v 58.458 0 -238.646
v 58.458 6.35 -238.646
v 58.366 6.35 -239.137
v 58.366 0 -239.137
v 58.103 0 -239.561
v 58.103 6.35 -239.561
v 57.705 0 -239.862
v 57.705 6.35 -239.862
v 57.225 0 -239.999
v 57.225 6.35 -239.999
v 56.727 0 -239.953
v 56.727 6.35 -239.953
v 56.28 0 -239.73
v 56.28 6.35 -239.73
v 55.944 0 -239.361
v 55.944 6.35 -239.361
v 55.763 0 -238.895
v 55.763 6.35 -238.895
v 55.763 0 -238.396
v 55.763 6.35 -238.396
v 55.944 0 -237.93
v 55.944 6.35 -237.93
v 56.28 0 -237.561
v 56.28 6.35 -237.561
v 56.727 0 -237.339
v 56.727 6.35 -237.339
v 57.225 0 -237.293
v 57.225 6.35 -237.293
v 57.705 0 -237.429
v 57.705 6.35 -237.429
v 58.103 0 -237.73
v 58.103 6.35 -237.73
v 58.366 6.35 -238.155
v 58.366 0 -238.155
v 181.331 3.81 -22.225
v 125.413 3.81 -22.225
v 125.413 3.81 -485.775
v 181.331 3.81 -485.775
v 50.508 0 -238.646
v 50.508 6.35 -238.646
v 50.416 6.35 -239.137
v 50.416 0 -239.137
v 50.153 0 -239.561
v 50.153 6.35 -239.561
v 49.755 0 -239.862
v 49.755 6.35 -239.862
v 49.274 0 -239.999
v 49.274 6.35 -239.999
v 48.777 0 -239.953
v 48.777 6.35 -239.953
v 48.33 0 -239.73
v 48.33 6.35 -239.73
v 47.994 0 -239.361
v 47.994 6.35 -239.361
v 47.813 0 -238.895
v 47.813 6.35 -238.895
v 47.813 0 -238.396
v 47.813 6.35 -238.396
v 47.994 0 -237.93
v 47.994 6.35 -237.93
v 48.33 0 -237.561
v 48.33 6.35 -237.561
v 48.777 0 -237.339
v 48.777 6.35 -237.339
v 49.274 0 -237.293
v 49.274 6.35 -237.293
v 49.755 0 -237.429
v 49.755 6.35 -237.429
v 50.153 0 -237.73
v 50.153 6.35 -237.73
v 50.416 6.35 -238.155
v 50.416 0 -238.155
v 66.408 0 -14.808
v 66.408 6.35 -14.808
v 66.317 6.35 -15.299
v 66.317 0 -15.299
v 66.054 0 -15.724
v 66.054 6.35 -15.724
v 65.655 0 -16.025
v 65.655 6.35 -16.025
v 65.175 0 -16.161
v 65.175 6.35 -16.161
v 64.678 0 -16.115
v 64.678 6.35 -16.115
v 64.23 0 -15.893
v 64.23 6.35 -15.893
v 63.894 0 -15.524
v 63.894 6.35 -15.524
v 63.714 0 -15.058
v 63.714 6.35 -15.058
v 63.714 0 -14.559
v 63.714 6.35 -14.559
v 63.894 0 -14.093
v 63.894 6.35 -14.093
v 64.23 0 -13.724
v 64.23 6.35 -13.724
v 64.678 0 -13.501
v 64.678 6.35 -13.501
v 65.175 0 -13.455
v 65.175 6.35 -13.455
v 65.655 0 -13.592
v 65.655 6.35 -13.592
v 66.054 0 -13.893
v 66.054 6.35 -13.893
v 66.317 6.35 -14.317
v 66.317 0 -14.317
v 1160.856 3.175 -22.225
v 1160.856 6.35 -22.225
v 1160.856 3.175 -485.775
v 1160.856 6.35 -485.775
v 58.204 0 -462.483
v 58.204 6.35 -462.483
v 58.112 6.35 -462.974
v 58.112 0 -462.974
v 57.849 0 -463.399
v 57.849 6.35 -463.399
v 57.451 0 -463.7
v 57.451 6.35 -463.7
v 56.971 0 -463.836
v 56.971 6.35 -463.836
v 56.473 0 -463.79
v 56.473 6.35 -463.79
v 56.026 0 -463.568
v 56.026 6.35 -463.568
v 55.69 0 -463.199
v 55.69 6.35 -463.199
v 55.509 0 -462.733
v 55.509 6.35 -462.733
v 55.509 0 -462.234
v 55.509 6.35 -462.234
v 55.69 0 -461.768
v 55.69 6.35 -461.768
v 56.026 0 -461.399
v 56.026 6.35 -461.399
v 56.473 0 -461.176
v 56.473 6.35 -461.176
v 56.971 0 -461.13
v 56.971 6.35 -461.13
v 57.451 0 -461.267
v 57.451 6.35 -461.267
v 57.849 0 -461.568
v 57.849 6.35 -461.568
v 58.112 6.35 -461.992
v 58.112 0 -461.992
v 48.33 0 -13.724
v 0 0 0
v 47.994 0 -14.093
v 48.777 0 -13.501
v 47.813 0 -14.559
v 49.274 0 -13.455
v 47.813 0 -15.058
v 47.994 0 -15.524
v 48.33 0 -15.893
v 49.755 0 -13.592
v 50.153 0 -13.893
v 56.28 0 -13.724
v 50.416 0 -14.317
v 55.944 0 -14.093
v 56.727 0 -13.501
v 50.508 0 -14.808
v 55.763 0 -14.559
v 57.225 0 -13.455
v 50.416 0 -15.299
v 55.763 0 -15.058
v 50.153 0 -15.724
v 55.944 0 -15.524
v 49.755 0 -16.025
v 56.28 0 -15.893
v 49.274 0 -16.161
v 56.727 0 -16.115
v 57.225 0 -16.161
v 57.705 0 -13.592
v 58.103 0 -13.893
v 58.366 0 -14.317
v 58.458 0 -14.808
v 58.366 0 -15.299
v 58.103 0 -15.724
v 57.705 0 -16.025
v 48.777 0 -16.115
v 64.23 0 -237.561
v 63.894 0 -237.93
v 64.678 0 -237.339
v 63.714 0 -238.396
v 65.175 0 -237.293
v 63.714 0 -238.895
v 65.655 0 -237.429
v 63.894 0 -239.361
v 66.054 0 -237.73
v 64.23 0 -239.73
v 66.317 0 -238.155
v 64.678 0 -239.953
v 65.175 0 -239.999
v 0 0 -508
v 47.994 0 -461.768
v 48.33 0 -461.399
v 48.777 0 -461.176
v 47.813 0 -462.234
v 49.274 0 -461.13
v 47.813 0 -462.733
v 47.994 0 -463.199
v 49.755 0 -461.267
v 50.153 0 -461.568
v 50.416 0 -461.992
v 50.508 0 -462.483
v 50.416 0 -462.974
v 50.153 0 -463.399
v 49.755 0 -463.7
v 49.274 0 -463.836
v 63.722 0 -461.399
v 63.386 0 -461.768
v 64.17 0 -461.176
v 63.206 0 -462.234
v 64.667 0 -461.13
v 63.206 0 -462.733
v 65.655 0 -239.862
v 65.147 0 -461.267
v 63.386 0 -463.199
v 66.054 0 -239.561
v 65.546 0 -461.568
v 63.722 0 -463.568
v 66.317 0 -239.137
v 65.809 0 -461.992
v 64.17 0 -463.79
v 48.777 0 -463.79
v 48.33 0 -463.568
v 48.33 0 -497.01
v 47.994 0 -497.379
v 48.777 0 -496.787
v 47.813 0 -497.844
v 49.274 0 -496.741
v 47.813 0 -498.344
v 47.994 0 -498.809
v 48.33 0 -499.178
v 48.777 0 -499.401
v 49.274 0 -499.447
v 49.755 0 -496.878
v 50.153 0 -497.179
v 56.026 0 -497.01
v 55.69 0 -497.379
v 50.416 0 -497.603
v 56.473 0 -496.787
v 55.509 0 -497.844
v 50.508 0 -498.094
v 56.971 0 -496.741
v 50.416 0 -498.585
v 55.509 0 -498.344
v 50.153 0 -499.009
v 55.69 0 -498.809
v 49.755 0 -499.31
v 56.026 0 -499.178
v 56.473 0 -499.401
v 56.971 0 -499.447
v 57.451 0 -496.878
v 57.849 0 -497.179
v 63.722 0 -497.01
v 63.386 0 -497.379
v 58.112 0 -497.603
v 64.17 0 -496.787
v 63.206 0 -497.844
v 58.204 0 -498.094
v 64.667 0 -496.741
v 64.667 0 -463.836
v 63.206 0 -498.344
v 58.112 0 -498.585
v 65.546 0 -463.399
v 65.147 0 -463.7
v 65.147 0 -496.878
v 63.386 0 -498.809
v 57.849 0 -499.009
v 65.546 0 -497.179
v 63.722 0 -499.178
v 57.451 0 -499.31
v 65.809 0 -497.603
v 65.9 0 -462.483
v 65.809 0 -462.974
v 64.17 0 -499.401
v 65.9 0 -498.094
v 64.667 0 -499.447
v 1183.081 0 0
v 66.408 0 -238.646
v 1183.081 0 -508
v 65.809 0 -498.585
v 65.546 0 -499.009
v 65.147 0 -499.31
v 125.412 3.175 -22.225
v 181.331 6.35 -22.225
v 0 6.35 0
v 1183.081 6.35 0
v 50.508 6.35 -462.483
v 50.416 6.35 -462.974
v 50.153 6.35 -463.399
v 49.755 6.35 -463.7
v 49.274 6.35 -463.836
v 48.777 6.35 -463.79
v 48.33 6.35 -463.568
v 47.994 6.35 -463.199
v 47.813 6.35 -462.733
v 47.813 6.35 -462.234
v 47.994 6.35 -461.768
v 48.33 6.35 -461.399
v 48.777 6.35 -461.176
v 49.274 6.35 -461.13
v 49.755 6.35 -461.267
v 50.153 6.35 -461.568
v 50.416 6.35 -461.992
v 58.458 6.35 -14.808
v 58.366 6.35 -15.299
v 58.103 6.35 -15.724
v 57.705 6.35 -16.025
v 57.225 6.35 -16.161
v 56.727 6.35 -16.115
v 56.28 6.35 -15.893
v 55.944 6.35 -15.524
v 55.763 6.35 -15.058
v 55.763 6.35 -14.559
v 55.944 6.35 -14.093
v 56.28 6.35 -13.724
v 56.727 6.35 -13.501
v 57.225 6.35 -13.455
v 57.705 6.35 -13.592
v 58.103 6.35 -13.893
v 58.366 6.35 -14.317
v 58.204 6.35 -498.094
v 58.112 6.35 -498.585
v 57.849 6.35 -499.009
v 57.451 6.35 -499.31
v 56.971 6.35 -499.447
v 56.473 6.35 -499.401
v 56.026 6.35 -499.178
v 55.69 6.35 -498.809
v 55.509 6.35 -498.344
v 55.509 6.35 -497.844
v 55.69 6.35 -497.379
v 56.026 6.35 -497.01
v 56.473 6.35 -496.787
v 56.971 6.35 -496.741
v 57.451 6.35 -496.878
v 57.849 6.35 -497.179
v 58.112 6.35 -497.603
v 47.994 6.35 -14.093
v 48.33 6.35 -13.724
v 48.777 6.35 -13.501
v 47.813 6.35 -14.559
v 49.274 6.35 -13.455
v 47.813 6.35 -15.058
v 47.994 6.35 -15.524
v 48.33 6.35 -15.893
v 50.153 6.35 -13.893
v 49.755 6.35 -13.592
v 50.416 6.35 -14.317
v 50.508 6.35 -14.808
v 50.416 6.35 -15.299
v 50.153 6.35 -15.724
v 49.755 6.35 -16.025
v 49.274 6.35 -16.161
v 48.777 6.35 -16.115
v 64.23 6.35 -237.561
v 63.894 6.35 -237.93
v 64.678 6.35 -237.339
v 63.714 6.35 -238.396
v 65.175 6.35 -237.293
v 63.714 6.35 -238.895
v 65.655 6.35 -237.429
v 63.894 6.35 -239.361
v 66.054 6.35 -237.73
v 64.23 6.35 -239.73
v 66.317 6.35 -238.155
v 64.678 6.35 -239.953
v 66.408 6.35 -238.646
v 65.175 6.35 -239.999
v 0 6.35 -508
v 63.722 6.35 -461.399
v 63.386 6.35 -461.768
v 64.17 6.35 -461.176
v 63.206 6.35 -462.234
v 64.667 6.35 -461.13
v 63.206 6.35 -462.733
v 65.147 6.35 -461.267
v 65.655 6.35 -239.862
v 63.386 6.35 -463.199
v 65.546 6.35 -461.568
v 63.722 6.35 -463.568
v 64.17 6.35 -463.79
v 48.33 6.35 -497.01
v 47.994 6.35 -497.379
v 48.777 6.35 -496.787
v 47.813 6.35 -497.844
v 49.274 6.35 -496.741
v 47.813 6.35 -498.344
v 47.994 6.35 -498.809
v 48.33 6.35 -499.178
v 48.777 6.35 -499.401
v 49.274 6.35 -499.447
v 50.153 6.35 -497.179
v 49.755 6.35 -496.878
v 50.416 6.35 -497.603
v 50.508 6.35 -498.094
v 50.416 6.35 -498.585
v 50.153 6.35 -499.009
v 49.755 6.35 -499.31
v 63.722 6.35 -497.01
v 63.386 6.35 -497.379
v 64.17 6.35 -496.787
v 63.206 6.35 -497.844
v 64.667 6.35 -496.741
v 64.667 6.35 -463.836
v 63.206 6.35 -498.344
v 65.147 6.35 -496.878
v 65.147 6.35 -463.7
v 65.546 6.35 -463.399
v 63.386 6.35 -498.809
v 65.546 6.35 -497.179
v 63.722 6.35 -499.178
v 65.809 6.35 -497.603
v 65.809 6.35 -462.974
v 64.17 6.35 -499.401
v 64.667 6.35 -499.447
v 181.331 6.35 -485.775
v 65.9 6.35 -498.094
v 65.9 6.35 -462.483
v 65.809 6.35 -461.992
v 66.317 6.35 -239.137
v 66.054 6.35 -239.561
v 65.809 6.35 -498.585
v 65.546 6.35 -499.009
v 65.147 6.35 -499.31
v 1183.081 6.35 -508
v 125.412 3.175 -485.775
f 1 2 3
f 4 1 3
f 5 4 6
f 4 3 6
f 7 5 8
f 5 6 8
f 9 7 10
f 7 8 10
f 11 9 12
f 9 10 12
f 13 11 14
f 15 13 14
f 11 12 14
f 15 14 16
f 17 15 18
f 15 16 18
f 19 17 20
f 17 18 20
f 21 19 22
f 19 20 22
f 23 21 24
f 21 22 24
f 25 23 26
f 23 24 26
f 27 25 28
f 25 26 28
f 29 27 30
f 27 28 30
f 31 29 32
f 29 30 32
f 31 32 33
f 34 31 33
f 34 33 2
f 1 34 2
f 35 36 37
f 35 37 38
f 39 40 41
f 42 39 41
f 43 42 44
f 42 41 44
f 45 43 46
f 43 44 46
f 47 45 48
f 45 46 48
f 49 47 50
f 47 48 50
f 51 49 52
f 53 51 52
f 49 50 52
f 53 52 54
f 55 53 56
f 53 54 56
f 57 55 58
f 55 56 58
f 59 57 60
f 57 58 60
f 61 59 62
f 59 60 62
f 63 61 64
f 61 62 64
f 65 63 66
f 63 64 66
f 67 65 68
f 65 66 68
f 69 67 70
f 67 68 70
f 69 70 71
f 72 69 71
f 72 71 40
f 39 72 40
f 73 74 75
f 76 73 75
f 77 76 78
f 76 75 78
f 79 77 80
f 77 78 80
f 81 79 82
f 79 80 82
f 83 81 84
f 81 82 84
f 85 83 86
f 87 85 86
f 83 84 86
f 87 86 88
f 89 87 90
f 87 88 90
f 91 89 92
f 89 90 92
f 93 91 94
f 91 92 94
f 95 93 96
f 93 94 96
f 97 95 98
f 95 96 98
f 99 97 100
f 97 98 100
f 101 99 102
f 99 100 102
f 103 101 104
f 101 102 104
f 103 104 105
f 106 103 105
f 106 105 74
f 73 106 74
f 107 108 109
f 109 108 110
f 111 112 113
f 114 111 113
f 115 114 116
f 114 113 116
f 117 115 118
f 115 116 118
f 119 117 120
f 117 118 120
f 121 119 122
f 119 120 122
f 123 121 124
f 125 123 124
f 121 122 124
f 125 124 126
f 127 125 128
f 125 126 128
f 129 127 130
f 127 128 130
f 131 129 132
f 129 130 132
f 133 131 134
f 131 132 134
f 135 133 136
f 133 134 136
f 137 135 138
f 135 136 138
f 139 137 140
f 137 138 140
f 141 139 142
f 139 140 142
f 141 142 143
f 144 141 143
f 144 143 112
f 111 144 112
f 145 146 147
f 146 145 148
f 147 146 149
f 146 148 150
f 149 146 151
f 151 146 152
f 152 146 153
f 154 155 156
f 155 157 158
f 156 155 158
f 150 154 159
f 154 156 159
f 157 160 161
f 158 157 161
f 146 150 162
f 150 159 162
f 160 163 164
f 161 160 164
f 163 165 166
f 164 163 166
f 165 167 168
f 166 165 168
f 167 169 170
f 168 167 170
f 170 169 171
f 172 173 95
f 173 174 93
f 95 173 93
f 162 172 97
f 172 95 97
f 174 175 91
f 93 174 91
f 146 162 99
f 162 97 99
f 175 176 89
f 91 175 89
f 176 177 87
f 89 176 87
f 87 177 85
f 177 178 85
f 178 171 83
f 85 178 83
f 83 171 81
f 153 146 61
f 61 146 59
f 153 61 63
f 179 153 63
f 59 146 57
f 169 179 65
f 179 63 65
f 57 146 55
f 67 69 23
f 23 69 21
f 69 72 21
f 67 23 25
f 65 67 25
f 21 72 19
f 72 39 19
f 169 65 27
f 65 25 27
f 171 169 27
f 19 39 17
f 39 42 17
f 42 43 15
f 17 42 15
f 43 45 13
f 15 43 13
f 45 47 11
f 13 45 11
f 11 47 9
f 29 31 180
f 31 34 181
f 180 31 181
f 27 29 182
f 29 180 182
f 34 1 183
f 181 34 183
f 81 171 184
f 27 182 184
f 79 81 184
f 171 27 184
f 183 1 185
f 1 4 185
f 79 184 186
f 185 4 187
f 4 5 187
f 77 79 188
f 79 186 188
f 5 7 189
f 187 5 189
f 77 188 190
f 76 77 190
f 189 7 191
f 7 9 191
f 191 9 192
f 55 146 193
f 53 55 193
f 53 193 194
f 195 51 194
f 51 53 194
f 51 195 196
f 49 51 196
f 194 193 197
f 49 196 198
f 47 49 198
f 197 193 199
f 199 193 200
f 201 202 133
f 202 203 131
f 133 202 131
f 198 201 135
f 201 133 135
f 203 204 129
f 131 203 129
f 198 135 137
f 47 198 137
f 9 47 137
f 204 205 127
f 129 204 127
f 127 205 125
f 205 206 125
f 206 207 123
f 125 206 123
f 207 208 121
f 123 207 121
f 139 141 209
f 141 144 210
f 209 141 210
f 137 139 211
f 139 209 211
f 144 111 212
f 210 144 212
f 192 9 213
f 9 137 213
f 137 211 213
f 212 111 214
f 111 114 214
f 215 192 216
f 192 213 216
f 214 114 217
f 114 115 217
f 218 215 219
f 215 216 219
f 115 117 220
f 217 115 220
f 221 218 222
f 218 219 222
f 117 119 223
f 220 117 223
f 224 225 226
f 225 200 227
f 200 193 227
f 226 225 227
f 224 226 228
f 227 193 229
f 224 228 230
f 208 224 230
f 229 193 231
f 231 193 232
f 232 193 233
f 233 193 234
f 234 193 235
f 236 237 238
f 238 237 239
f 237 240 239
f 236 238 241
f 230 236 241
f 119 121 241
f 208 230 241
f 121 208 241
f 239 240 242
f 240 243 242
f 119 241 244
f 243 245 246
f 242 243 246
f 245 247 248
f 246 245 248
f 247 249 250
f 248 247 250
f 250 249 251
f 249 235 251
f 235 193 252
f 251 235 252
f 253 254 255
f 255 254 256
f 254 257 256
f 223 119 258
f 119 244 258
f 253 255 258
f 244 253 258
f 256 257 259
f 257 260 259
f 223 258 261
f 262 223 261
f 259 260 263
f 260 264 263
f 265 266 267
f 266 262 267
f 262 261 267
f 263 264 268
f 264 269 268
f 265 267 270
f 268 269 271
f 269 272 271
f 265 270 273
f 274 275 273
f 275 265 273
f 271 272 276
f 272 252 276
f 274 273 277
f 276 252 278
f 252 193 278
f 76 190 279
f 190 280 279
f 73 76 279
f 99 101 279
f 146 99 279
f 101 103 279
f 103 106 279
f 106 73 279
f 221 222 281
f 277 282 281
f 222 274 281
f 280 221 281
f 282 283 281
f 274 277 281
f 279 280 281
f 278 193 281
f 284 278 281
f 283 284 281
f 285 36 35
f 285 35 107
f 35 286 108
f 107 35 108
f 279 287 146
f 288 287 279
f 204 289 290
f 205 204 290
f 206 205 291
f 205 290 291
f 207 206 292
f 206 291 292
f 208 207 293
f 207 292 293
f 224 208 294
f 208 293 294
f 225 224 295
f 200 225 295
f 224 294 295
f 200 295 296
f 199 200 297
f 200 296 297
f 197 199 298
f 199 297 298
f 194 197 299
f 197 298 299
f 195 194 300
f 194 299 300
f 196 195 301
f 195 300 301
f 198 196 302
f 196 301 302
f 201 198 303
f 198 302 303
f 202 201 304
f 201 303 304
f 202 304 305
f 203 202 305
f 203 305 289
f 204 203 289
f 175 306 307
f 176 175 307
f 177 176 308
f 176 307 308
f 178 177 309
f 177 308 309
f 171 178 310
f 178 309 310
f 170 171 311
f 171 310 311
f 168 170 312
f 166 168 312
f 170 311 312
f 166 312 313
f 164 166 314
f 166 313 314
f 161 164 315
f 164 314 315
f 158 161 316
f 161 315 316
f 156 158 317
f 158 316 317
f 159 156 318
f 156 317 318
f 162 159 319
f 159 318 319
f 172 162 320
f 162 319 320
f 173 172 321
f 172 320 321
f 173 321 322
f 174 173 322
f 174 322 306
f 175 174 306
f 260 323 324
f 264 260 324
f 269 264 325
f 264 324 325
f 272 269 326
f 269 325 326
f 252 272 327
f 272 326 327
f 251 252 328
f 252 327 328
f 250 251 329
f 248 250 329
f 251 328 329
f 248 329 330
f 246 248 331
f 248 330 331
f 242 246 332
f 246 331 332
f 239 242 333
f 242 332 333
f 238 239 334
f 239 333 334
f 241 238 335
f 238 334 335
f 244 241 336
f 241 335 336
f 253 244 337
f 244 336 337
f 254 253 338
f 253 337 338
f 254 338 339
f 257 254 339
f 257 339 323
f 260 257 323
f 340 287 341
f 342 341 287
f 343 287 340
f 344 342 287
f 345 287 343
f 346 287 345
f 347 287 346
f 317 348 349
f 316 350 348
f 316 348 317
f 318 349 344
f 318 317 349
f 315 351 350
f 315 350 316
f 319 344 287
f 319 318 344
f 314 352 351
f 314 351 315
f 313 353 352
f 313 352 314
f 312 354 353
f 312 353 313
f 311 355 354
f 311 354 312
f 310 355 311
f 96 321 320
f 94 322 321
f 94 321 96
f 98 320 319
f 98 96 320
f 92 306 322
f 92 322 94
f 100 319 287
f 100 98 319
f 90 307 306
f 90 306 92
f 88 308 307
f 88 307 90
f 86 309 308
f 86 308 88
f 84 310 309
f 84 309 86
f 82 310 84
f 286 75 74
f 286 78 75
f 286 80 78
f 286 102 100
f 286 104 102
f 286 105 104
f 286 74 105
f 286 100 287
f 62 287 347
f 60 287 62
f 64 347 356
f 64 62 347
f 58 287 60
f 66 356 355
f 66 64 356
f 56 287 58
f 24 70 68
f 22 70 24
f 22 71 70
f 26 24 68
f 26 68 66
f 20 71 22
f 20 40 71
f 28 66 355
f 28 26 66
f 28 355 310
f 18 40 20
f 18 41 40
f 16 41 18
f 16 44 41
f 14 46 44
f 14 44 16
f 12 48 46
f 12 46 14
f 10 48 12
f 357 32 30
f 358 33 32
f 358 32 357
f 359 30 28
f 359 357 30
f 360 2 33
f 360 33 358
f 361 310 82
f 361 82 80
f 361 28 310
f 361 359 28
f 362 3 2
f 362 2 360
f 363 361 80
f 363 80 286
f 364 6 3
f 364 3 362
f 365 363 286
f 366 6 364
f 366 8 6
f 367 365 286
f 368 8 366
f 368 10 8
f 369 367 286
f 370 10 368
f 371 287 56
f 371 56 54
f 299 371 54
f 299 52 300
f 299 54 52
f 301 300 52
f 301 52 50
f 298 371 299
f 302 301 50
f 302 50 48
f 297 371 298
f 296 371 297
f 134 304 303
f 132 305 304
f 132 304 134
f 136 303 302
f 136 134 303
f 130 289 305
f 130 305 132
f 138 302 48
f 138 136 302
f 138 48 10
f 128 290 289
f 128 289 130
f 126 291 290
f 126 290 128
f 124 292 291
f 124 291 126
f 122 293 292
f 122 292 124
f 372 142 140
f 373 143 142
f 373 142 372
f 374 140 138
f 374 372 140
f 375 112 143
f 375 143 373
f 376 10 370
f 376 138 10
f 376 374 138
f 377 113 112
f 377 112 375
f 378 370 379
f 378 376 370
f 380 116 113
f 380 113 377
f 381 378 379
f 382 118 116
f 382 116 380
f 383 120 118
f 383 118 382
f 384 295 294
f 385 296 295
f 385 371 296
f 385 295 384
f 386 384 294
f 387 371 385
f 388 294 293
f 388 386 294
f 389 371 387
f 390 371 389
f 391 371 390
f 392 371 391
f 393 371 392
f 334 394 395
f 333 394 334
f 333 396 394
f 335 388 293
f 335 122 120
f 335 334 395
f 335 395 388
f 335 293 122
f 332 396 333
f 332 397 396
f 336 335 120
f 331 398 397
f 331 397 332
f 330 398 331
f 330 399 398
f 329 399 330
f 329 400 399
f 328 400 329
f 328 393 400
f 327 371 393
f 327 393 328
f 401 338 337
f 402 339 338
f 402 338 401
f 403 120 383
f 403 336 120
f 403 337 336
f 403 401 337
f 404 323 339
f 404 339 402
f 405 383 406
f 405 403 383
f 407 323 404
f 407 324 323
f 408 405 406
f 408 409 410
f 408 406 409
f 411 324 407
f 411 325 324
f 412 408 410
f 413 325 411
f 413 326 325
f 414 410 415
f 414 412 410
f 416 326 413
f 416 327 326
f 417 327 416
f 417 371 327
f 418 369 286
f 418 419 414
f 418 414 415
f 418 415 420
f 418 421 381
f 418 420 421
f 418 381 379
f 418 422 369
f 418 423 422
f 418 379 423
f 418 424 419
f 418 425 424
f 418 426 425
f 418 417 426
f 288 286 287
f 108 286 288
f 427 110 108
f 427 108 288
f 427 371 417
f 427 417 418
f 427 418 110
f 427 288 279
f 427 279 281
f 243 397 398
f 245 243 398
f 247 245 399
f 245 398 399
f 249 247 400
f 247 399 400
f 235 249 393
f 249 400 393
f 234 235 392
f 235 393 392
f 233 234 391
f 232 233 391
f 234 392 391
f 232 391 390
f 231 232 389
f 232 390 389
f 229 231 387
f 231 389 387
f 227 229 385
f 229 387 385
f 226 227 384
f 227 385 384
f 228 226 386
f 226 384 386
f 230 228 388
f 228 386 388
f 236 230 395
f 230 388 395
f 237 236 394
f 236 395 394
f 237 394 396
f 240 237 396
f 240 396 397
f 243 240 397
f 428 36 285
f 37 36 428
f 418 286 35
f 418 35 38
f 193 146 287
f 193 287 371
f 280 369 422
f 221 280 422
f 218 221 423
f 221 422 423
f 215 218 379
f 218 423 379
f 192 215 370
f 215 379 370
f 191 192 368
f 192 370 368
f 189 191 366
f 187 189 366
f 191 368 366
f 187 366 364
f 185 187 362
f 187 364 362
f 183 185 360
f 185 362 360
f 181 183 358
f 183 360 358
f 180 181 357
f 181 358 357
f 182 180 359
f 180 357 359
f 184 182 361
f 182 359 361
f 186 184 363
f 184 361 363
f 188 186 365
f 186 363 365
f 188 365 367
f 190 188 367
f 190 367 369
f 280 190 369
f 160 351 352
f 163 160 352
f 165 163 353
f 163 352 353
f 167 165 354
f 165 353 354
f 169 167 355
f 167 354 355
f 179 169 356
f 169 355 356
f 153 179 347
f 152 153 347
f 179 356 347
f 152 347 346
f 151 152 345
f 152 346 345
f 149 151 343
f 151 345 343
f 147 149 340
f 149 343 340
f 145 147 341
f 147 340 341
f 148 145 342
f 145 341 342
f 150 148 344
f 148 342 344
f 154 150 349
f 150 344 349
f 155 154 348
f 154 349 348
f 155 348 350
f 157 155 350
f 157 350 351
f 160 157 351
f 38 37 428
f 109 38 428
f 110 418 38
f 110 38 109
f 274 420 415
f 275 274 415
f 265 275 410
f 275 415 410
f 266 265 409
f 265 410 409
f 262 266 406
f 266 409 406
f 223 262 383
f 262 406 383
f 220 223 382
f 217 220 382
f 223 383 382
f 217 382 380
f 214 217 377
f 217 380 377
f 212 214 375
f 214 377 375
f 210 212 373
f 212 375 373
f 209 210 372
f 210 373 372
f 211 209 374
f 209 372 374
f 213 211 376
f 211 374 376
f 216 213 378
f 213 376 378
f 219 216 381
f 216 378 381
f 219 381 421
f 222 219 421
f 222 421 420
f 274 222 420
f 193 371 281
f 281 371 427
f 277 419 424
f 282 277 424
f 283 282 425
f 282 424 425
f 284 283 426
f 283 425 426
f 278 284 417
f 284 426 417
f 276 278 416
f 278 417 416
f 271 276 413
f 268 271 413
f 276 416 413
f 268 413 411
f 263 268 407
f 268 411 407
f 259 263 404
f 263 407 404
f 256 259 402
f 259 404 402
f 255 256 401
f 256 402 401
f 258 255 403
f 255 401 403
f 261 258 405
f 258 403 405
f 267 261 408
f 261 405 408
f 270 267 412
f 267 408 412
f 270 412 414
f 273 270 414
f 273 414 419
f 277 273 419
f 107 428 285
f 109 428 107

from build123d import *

# Parameters (mm, degrees)
SKETCH1_W           = 1066.8
SKETCH1_H           = 508
BOSS_EXTRUDE1_DEPTH = 6.35
SKETCH2_W           = 919.1625
SKETCH2_H           = 463.55
CUT_EXTRUDE1_DEPTH  = 3.175
SKETCH3_R           = 1.3589
CUT_EXTRUDE2_DEPTH  = 7.35
SKETCH5_W           = 55.9181
SKETCH5_H           = 463.55
BOSS_EXTRUDE2_DEPTH = 2.54
SKETCH6_W           = 116.2812
SKETCH6_H           = 508
BOSS_EXTRUDE3_DEPTH = 6.35
SKETCH7_W           = 116.2812
SKETCH7_H           = 463.55
CUT_EXTRUDE3_DEPTH  = 3.175


with BuildPart() as part:
    # Sketch1 → Boss-Extrude1 (new body)
    with BuildSketch(Plane(origin=(0, 0, 0), x_dir=(1, 0, 0), z_dir=(0, 1, 0))):
        with Locations((533.4, 254)):
            Rectangle(SKETCH1_W, SKETCH1_H)
    extrude(amount=BOSS_EXTRUDE1_DEPTH)

    # Sketch2 → Cut-Extrude1 (cut)
    with BuildSketch(Plane(origin=(0, 6.35, 0), x_dir=(1, 0, 0), z_dir=(0, 1, 0))):
        with Locations((584.99375, 254)):
            Rectangle(SKETCH2_W, SKETCH2_H)
    extrude(amount=-CUT_EXTRUDE1_DEPTH, mode=Mode.SUBTRACT)

    # Sketch3 → Cut-Extrude2 (cut, through all)
    with BuildSketch(Plane(origin=(0, 6.35, 0), x_dir=(1, 0, 0), z_dir=(0, 1, 0))):
        with Locations((49.149, 462.4832)):
            Circle(SKETCH3_R)
        with Locations((49.149, 498.094)):
            Circle(SKETCH3_R)
        with Locations((56.8452, 498.094)):
            Circle(SKETCH3_R)
        with Locations((56.8452, 462.4832)):
            Circle(SKETCH3_R)
        with Locations((64.5414, 498.094)):
            Circle(SKETCH3_R)
        with Locations((64.5414, 462.4832)):
            Circle(SKETCH3_R)
        with Locations((49.149, 14.8082)):
            Circle(SKETCH3_R)
        with Locations((57.0992, 14.8082)):
            Circle(SKETCH3_R)
        with Locations((65.0494, 14.8082)):
            Circle(SKETCH3_R)
        with Locations((49.149, 238.6457)):
            Circle(SKETCH3_R)
        with Locations((57.0992, 238.6457)):
            Circle(SKETCH3_R)
        with Locations((65.0494, 238.6457)):
            Circle(SKETCH3_R)
    extrude(amount=-CUT_EXTRUDE2_DEPTH, mode=Mode.SUBTRACT)

    # Sketch5 → Boss-Extrude2 (add)
    with BuildSketch(Plane(origin=(0, 6.35, 0), x_dir=(1, 0, 0), z_dir=(0, 1, 0))):
        with Locations((153.37155, 254)):
            Rectangle(SKETCH5_W, SKETCH5_H)
    extrude(amount=-BOSS_EXTRUDE2_DEPTH)

    # Sketch6 → Boss-Extrude3 (add)
    with BuildSketch(Plane(origin=(0, 6.35, 0), x_dir=(1, 0, 0), z_dir=(0, 1, 0))):
        with Locations((1124.9406, 254)):
            Rectangle(SKETCH6_W, SKETCH6_H)
    extrude(amount=-BOSS_EXTRUDE3_DEPTH)

    # Sketch7 → Cut-Extrude3 (cut)
    with BuildSketch(Plane(origin=(0, 6.35, 0), x_dir=(1, 0, 0), z_dir=(0, 1, 0))):
        with Locations((1102.7156, 254)):
            Rectangle(SKETCH7_W, SKETCH7_H)
    extrude(amount=-CUT_EXTRUDE3_DEPTH, mode=Mode.SUBTRACT)


solid = part.part
